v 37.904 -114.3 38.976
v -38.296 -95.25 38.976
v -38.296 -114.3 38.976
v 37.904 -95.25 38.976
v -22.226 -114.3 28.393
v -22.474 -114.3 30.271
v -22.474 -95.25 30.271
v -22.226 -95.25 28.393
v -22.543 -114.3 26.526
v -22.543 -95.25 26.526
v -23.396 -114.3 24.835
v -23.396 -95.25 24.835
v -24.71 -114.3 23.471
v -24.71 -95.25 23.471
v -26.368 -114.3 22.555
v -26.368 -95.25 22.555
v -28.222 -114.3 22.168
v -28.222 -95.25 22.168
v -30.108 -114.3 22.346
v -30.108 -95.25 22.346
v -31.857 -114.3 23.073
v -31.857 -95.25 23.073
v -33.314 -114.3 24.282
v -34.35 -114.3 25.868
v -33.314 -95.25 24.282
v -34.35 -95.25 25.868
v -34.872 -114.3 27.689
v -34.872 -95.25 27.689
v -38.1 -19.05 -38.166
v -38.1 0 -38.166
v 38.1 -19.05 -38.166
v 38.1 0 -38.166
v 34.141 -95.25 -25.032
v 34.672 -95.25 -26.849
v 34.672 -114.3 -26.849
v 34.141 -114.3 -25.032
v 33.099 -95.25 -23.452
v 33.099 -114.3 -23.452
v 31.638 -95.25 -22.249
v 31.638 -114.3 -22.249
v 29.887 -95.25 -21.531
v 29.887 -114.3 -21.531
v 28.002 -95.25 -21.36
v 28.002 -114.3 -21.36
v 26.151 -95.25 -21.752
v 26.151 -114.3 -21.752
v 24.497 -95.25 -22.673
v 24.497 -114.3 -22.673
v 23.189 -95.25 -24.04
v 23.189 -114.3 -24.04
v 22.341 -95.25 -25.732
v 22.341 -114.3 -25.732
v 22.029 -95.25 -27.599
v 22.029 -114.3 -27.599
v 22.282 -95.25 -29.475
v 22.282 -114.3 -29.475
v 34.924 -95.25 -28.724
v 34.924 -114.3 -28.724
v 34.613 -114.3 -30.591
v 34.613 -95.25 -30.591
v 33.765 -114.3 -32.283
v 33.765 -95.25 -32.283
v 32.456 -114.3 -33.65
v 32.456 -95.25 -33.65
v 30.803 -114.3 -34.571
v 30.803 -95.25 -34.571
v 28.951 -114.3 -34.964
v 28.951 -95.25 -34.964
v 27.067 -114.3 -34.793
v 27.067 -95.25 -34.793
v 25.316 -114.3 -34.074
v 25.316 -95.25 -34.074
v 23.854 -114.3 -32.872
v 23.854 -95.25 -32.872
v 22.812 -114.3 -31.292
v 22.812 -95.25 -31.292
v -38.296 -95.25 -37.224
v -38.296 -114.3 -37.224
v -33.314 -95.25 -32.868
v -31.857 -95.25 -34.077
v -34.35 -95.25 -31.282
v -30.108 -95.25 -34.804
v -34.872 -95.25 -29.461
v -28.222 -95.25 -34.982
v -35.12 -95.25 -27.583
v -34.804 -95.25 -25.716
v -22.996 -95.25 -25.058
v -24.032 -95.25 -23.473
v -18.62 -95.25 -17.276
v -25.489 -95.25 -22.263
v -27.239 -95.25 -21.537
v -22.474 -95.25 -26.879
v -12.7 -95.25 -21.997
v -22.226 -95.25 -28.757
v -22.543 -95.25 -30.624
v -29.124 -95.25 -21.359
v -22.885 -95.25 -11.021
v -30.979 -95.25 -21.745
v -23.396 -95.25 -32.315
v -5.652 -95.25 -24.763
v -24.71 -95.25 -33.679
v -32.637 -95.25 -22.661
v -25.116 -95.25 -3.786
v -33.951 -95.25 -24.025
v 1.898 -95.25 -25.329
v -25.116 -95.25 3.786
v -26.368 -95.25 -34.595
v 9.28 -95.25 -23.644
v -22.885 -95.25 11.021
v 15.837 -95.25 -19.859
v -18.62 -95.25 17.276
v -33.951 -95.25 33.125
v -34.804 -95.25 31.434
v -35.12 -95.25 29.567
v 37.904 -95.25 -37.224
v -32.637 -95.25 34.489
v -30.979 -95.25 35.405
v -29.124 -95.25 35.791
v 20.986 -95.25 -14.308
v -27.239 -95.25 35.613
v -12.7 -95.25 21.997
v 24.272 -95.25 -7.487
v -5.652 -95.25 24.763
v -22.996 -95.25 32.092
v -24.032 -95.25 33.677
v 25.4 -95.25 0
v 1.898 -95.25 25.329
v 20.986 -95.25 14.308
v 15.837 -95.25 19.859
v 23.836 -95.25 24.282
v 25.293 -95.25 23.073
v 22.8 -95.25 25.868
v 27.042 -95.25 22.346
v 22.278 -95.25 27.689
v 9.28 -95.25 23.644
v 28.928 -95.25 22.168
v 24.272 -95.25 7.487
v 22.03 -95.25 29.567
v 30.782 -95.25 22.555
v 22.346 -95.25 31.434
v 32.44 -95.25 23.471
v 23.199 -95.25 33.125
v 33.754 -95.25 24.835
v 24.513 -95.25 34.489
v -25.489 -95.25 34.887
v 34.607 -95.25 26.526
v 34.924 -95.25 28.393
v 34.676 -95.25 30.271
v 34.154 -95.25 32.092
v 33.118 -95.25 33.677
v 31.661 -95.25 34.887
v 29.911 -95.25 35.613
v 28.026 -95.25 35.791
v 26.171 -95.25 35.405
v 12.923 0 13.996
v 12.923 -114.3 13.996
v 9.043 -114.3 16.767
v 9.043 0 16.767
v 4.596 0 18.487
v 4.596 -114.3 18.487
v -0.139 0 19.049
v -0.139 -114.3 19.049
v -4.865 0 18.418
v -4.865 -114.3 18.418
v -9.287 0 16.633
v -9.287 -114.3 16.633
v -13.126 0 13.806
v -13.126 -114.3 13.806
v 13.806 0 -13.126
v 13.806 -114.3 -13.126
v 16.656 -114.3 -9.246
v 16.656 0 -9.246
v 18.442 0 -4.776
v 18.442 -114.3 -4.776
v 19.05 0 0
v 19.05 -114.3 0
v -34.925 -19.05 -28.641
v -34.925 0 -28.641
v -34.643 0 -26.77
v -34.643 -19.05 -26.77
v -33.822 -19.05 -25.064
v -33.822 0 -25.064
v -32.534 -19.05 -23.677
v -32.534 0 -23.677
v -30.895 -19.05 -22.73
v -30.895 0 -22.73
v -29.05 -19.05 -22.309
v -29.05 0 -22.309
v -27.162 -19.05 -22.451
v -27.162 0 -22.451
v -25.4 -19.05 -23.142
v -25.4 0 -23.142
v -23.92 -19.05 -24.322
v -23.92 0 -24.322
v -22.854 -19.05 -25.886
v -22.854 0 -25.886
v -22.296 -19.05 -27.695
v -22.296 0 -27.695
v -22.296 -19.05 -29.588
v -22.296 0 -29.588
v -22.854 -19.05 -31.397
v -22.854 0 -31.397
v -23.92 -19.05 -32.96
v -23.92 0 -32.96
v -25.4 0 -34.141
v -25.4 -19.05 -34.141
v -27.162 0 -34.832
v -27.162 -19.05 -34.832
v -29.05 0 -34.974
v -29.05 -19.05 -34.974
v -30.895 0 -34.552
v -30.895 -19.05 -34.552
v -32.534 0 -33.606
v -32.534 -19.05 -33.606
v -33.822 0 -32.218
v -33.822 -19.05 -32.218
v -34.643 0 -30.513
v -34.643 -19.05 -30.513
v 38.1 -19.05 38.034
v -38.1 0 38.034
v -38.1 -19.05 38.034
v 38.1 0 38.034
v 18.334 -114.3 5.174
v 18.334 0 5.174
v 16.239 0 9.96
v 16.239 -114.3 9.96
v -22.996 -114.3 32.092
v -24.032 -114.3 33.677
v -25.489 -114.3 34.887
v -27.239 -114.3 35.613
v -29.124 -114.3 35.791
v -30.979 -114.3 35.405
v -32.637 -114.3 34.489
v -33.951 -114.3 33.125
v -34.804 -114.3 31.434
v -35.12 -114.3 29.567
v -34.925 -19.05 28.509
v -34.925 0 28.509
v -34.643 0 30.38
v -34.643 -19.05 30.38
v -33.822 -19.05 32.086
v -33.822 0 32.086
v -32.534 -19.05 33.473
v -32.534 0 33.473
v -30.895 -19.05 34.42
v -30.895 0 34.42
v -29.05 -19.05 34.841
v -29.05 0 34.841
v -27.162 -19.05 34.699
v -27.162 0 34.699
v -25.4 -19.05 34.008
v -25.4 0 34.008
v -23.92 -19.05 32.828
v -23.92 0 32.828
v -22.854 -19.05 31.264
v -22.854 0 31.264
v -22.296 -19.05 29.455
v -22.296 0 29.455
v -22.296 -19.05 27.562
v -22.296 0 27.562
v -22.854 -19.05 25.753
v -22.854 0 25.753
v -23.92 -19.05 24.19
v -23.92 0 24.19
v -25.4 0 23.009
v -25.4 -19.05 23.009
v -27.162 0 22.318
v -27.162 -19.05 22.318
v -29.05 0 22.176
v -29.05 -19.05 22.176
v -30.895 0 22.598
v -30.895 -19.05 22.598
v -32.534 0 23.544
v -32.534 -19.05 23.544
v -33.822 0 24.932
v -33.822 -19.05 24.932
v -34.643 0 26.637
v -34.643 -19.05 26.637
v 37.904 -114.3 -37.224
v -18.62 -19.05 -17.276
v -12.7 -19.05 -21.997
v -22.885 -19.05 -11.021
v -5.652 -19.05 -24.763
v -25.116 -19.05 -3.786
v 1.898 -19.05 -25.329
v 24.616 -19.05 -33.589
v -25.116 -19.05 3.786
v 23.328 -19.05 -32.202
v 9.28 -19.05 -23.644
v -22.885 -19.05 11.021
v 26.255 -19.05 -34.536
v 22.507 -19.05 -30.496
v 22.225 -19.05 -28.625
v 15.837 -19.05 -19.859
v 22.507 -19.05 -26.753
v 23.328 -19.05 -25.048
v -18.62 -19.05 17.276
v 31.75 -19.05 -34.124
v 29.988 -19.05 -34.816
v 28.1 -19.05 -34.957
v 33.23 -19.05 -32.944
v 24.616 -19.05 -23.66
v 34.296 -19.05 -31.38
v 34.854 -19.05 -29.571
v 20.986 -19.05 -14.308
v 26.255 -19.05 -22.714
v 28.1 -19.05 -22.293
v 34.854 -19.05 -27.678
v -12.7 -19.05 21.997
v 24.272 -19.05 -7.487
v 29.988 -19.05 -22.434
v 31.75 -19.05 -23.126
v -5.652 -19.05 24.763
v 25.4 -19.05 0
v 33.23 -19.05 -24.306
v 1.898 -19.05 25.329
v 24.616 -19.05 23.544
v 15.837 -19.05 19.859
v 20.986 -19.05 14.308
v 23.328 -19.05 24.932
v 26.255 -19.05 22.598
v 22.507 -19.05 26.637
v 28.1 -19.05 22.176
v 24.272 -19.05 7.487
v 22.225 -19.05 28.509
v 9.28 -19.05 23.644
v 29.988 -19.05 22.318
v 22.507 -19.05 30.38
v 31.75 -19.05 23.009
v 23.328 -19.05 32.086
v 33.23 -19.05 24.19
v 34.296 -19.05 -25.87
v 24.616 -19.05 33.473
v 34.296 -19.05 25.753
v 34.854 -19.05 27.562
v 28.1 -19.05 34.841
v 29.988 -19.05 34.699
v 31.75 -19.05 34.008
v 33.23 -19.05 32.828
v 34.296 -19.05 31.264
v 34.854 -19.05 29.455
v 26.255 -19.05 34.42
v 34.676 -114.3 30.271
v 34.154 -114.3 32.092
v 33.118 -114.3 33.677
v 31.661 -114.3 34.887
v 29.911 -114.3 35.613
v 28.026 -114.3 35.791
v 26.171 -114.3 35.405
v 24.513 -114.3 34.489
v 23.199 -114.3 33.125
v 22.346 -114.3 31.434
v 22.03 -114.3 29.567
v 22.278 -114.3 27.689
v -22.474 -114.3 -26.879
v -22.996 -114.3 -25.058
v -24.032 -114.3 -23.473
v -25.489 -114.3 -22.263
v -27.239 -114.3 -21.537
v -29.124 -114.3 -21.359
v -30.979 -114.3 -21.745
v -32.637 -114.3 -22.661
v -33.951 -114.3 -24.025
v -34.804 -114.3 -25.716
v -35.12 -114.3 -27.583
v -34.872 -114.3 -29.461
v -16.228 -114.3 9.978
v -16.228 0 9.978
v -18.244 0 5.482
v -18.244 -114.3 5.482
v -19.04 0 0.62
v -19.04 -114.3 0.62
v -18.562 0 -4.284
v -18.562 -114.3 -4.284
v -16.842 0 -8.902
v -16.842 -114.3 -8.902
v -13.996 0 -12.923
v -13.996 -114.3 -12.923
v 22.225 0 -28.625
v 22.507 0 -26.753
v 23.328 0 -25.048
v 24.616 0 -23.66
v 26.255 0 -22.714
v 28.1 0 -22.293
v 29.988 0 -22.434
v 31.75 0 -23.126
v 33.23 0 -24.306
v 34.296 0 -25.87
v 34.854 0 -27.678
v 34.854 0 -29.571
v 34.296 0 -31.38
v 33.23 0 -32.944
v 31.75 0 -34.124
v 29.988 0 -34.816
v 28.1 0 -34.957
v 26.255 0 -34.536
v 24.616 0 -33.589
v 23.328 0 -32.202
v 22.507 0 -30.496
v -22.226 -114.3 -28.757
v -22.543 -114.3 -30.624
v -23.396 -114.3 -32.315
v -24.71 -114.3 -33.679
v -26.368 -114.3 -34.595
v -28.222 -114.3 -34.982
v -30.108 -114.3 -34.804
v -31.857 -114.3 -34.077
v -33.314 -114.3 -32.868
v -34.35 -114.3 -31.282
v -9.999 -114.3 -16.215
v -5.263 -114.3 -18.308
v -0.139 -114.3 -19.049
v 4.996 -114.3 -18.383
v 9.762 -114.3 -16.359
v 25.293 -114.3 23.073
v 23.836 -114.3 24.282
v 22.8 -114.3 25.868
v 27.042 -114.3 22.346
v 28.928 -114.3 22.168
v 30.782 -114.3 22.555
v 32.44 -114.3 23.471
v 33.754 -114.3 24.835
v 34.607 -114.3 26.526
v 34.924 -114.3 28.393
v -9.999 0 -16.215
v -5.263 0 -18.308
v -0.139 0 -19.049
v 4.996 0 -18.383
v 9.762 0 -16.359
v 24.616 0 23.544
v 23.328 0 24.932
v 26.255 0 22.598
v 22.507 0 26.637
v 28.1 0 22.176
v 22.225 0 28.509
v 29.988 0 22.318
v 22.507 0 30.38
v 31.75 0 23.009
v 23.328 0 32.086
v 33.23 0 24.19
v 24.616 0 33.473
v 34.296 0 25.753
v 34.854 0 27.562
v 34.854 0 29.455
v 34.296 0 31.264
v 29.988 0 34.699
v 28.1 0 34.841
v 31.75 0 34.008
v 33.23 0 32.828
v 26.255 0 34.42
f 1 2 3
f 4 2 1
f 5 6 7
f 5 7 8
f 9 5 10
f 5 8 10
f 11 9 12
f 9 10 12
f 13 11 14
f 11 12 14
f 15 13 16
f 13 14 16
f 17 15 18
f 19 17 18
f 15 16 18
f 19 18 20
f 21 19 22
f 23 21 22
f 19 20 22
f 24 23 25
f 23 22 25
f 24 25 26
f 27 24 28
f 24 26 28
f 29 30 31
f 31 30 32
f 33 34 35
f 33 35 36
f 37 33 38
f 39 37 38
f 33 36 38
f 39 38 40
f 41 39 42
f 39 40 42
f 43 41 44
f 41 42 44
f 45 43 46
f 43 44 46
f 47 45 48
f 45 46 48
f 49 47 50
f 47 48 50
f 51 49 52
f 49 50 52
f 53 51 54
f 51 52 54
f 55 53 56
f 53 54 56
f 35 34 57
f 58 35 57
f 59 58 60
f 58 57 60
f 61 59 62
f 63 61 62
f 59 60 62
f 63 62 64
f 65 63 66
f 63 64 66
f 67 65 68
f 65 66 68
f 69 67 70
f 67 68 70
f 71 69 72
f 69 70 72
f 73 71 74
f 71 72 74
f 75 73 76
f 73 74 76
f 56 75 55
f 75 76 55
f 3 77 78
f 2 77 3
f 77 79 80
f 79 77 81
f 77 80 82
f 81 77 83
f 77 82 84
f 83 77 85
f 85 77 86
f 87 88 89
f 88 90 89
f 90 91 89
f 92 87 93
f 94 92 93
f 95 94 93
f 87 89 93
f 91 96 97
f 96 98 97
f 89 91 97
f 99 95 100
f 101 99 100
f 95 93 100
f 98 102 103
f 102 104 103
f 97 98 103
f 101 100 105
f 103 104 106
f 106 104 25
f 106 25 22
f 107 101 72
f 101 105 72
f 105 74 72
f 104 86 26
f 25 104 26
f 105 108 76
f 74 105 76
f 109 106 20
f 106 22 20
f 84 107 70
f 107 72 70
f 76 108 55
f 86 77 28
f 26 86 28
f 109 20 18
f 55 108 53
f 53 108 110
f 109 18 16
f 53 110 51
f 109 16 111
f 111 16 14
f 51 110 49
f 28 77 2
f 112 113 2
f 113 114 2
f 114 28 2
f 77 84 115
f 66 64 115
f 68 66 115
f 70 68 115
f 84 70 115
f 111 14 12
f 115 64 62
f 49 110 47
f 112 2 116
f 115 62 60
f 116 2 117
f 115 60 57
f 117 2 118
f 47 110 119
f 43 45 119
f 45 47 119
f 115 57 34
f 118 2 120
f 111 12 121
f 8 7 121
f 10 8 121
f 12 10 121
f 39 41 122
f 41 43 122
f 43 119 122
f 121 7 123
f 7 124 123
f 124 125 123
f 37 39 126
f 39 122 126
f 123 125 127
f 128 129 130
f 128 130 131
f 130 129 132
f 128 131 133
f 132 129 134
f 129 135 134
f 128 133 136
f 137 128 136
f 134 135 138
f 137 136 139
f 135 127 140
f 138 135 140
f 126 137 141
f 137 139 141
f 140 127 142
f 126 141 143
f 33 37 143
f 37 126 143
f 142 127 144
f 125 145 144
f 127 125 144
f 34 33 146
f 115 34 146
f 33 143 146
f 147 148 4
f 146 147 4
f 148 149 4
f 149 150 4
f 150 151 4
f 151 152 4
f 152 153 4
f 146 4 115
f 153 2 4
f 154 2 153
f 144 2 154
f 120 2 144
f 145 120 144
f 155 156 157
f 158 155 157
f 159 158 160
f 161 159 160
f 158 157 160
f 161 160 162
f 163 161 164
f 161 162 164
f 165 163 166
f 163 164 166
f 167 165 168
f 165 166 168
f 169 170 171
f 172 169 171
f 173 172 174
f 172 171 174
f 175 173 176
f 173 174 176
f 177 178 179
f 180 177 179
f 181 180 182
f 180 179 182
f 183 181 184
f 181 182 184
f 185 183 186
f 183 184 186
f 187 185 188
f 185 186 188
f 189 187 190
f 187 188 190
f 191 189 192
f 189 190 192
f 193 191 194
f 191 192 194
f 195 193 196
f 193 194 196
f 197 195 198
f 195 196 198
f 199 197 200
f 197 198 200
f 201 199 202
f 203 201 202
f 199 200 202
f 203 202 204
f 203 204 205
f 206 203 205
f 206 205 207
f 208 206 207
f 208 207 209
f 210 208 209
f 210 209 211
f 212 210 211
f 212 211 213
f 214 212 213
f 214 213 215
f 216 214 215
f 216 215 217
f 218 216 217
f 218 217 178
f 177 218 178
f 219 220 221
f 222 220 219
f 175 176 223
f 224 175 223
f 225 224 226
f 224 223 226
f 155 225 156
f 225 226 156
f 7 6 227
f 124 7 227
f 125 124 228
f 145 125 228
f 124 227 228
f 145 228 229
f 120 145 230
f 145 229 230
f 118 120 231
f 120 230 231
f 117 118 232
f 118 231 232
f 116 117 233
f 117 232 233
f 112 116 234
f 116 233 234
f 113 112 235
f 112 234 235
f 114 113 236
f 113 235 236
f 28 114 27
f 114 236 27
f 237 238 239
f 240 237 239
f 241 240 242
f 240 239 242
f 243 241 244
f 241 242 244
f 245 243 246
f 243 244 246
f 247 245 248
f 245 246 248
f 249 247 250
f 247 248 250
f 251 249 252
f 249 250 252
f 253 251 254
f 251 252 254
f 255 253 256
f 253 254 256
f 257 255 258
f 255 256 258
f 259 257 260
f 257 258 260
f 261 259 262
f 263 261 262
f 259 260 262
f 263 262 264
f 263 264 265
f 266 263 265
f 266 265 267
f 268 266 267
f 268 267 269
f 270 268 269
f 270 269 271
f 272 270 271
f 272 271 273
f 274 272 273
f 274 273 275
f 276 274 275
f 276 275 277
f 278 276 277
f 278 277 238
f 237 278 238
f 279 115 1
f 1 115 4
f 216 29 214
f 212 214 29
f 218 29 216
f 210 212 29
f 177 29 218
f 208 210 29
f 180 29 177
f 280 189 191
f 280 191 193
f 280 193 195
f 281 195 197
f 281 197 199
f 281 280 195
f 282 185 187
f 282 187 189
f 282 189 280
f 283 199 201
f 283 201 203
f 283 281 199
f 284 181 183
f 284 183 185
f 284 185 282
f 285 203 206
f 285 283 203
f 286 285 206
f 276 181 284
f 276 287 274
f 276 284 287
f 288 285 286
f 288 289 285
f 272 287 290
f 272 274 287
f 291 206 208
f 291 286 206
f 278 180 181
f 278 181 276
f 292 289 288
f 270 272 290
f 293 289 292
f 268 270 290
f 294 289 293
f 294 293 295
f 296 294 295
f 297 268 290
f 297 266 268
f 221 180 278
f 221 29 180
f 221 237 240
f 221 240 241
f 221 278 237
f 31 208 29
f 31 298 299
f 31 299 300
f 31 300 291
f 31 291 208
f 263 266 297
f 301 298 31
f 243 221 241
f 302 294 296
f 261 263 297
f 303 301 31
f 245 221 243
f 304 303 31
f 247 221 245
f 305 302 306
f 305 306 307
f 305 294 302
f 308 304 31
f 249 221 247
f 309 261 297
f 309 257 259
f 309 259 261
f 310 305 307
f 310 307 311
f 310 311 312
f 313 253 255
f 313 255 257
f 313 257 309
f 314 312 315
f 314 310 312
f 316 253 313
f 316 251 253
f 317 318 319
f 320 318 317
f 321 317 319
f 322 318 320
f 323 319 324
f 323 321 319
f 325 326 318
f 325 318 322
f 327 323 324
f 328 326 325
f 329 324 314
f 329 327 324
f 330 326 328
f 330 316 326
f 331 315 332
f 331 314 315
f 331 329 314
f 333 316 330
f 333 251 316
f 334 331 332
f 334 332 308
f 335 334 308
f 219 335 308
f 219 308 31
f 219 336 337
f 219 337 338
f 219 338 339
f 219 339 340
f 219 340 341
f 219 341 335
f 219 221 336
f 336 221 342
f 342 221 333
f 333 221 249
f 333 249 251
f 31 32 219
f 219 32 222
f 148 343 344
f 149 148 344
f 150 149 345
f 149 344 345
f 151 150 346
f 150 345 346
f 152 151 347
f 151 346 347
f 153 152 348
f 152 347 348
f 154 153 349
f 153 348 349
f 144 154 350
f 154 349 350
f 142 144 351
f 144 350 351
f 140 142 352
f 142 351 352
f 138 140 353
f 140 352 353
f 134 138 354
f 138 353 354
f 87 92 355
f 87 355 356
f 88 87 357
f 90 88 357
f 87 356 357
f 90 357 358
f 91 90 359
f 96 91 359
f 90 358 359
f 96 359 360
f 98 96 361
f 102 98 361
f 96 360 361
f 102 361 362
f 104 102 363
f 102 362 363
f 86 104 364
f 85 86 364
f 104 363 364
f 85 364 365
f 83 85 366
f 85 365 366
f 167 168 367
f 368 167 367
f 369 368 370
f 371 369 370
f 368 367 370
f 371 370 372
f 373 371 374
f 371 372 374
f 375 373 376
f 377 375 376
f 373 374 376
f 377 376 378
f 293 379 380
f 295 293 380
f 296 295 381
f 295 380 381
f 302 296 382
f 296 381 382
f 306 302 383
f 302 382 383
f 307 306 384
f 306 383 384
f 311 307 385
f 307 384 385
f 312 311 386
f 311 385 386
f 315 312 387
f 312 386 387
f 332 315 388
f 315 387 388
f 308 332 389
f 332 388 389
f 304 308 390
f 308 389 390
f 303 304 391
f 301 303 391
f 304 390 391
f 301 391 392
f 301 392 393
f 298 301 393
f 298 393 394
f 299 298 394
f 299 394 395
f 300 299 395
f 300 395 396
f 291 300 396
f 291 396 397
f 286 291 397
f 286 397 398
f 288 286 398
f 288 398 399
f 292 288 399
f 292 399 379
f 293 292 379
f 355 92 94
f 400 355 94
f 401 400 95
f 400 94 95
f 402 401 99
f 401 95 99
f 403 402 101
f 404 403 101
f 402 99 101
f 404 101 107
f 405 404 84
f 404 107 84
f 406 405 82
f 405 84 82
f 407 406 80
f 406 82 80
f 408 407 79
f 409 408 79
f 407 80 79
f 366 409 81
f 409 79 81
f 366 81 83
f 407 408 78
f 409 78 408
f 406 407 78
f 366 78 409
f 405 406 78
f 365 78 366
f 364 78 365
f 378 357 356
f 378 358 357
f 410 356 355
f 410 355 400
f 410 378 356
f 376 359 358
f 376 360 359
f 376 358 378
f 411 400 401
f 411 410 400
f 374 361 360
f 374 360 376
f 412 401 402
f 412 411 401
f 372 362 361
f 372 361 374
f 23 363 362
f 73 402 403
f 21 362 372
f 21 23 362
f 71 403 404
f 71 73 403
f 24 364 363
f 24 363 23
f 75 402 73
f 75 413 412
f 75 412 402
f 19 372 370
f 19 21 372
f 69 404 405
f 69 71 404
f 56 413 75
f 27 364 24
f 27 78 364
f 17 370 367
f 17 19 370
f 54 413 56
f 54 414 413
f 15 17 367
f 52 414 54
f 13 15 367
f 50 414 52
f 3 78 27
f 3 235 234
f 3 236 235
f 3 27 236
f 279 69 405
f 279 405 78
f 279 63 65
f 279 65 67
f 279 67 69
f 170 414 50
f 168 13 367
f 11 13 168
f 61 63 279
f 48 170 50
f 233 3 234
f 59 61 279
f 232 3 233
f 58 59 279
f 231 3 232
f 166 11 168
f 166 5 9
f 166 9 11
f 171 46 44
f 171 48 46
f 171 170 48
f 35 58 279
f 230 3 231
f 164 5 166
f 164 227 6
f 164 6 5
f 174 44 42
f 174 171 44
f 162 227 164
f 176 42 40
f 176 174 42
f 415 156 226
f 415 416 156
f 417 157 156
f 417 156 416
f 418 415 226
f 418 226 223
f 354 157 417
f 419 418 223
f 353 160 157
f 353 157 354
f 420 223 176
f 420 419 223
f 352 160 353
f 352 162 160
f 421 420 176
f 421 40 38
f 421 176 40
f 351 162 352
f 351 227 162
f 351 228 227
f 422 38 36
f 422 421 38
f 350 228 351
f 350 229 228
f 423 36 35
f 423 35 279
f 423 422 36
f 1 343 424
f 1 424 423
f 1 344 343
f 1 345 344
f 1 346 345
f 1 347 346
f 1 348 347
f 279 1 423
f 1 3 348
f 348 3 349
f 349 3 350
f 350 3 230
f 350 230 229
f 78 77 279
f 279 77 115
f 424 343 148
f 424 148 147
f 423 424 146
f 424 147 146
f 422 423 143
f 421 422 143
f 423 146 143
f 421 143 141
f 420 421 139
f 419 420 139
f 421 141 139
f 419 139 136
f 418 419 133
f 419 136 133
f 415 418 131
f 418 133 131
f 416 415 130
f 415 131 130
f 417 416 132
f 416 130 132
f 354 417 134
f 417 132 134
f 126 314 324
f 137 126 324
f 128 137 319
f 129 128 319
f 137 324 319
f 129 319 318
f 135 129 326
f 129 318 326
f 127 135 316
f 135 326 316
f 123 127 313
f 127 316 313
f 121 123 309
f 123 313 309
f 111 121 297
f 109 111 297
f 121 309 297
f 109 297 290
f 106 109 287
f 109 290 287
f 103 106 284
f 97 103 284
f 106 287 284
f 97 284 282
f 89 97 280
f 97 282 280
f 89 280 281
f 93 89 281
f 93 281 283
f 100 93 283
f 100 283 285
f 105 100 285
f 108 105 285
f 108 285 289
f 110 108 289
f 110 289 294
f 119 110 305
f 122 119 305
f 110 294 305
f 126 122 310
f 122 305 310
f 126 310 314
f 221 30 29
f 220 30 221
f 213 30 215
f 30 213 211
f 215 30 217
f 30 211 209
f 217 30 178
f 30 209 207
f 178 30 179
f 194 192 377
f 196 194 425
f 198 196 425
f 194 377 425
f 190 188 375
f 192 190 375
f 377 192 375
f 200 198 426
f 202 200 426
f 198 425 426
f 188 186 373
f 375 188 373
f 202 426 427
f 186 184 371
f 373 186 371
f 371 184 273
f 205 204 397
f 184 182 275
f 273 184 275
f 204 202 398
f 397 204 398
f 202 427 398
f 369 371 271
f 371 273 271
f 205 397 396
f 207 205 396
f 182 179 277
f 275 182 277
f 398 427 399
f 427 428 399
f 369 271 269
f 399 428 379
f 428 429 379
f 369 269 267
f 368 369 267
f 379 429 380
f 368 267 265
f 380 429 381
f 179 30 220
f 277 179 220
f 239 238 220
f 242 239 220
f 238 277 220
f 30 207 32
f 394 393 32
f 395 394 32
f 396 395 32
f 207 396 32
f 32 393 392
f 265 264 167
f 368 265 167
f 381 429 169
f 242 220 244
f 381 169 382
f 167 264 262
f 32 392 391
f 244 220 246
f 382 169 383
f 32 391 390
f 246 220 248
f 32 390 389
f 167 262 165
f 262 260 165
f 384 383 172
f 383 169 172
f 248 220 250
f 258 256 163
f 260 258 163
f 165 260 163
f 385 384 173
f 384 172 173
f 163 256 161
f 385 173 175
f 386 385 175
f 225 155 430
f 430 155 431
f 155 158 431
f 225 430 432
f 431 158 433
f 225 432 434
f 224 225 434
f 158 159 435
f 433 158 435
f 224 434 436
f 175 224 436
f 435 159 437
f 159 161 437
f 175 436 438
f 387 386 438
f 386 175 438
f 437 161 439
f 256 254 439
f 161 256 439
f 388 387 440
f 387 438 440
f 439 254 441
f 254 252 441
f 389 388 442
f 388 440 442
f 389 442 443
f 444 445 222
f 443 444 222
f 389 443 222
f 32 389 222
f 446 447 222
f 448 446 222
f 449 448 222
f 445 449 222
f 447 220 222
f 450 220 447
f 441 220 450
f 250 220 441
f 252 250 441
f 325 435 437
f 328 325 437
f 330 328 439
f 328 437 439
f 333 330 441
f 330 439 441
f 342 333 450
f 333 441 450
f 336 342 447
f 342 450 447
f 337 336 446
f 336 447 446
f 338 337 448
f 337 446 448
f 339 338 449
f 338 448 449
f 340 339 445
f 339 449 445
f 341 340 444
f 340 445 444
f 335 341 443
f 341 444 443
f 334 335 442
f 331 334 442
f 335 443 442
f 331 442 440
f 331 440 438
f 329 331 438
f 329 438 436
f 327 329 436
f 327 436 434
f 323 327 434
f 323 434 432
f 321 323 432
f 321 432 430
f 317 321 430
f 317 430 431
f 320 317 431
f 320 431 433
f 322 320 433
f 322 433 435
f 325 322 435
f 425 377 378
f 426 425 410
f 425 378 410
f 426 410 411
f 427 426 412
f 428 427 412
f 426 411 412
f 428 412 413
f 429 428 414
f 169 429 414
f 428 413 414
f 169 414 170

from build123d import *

# Parameters (mm, degrees)
F0_W      = 76.2
F0_H      = 76.2
F1_DEPTH  = 19.05
F2_R      = 25.4
F3_DEPTH  = 76.2
F5_W      = 76.2
F5_H      = 76.2
F5_R      = 25.4
F4_R      = 25.4
F6_DEPTH  = 19.05
F8_DEPTH  = 114.301
F9_R      = 6.35
F10_R     = 6.35
F11_DEPTH = 25.4
F12_R     = 6.35
F13_DEPTH = 114.301


with BuildPart() as f1:
    # F0 (on Front) → F1 (new body)
    with BuildSketch(Plane.XZ):
        with Locations((0, -0.0663684971)):
            Rectangle(F0_W, F0_H)
    extrude(amount=F1_DEPTH)

    # F2 (on face) → F3 (join)
    with BuildSketch(Plane.XZ.offset(19.05)):
        Circle(F2_R)
    extrude(amount=F3_DEPTH)

    # F5 (on face) + F4 (on face) → F6 (join)
    with BuildSketch(Plane.XZ.offset(95.25)):
        with Locations((-0.1962948591, 0.8762047957)):
            Rectangle(F5_W, F5_H)
        Circle(F5_R, mode=Mode.SUBTRACT)
    with BuildSketch(Plane.XZ.offset(95.25)):
        Circle(F4_R)
    extrude(amount=F6_DEPTH)

    # F7 (on face) → F8 (cut, through all)
    with BuildSketch(Plane.XZ.offset(114.3)):
        with BuildLine():
            Line((-0.196411438, 0.8763213746), (-13.1261387718, 13.8060487085))
            ThreePointArc((-13.1261387718, 13.8060487085), (-19.0399198266, 0.6196394072), (-13.9960272385, -12.9233788747))
            Line((-13.9960272385, -12.9233788747), (-0.196411438, 0.8763213746))
        make_face()
        with BuildLine():
            Line((13.8060487085, -13.1261387718), (-0.196411438, 0.8763213746))
            Line((-0.196411438, 0.8763213746), (-13.9960272385, -12.9233788747))
            ThreePointArc((-13.9960272385, -12.9233788747), (-0.1389275151, -19.0494934092), (13.8060487085, -13.1261387718))
        make_face()
        with BuildLine():
            Line((12.923293224, 13.9961063245), (-0.196411438, 0.8763213746))
            Line((-0.196411438, 0.8763213746), (13.8060487085, -13.1261387718))
            ThreePointArc((13.8060487085, -13.1261387718), (17.690502083, -7.067434899), (19.05, 0))
            ThreePointArc((19.05, 0), (17.4512354279, 7.6391676275), (12.923293224, 13.9961063245))
        make_face()
        with BuildLine():
            ThreePointArc((12.923293224, 13.9961063245), (-0.138985803, 19.049492984), (-13.1261387718, 13.8060487085))
            Line((-13.1261387718, 13.8060487085), (-0.196411438, 0.8763213746))
            Line((-0.196411438, 0.8763213746), (12.923293224, 13.9961063245))
        make_face()
    extrude(amount=-F8_DEPTH, mode=Mode.SUBTRACT)

    # F9 (on face) + F10 (on face) → F11 (cut)
    with BuildSketch(Plane.XZ.offset(114.3)):
        with Locations((28.3787051409, -27.6987952043)):
            Circle(F9_R)
        with Locations((-28.7712948591, 29.4512047957)):
            Circle(F9_R)
        with Locations((-28.7712948591, -27.6987952043)):
            Circle(F9_R)
    with BuildSketch(Plane.XZ.offset(114.3)):
        with Locations((28.3787051409, 29.4512047957)):
            Circle(F10_R)
    extrude(amount=-F11_DEPTH, mode=Mode.SUBTRACT)

    # F12 (on face) → F13 (cut, through all)
    with BuildSketch(Plane(origin=(0, 0, 0), x_dir=(-1, 0, 0), z_dir=(0, 1, 0))):
        with Locations((28.575, -28.6413684971)):
            Circle(F12_R)
        with Locations((28.575, 28.5086315029)):
            Circle(F12_R)
        with Locations((-28.575, 28.5086315029)):
            Circle(F12_R)
        with Locations((-28.575, -28.6247763728)):
            Circle(F12_R)
    extrude(amount=-F13_DEPTH, mode=Mode.SUBTRACT)


solid = f1.part
